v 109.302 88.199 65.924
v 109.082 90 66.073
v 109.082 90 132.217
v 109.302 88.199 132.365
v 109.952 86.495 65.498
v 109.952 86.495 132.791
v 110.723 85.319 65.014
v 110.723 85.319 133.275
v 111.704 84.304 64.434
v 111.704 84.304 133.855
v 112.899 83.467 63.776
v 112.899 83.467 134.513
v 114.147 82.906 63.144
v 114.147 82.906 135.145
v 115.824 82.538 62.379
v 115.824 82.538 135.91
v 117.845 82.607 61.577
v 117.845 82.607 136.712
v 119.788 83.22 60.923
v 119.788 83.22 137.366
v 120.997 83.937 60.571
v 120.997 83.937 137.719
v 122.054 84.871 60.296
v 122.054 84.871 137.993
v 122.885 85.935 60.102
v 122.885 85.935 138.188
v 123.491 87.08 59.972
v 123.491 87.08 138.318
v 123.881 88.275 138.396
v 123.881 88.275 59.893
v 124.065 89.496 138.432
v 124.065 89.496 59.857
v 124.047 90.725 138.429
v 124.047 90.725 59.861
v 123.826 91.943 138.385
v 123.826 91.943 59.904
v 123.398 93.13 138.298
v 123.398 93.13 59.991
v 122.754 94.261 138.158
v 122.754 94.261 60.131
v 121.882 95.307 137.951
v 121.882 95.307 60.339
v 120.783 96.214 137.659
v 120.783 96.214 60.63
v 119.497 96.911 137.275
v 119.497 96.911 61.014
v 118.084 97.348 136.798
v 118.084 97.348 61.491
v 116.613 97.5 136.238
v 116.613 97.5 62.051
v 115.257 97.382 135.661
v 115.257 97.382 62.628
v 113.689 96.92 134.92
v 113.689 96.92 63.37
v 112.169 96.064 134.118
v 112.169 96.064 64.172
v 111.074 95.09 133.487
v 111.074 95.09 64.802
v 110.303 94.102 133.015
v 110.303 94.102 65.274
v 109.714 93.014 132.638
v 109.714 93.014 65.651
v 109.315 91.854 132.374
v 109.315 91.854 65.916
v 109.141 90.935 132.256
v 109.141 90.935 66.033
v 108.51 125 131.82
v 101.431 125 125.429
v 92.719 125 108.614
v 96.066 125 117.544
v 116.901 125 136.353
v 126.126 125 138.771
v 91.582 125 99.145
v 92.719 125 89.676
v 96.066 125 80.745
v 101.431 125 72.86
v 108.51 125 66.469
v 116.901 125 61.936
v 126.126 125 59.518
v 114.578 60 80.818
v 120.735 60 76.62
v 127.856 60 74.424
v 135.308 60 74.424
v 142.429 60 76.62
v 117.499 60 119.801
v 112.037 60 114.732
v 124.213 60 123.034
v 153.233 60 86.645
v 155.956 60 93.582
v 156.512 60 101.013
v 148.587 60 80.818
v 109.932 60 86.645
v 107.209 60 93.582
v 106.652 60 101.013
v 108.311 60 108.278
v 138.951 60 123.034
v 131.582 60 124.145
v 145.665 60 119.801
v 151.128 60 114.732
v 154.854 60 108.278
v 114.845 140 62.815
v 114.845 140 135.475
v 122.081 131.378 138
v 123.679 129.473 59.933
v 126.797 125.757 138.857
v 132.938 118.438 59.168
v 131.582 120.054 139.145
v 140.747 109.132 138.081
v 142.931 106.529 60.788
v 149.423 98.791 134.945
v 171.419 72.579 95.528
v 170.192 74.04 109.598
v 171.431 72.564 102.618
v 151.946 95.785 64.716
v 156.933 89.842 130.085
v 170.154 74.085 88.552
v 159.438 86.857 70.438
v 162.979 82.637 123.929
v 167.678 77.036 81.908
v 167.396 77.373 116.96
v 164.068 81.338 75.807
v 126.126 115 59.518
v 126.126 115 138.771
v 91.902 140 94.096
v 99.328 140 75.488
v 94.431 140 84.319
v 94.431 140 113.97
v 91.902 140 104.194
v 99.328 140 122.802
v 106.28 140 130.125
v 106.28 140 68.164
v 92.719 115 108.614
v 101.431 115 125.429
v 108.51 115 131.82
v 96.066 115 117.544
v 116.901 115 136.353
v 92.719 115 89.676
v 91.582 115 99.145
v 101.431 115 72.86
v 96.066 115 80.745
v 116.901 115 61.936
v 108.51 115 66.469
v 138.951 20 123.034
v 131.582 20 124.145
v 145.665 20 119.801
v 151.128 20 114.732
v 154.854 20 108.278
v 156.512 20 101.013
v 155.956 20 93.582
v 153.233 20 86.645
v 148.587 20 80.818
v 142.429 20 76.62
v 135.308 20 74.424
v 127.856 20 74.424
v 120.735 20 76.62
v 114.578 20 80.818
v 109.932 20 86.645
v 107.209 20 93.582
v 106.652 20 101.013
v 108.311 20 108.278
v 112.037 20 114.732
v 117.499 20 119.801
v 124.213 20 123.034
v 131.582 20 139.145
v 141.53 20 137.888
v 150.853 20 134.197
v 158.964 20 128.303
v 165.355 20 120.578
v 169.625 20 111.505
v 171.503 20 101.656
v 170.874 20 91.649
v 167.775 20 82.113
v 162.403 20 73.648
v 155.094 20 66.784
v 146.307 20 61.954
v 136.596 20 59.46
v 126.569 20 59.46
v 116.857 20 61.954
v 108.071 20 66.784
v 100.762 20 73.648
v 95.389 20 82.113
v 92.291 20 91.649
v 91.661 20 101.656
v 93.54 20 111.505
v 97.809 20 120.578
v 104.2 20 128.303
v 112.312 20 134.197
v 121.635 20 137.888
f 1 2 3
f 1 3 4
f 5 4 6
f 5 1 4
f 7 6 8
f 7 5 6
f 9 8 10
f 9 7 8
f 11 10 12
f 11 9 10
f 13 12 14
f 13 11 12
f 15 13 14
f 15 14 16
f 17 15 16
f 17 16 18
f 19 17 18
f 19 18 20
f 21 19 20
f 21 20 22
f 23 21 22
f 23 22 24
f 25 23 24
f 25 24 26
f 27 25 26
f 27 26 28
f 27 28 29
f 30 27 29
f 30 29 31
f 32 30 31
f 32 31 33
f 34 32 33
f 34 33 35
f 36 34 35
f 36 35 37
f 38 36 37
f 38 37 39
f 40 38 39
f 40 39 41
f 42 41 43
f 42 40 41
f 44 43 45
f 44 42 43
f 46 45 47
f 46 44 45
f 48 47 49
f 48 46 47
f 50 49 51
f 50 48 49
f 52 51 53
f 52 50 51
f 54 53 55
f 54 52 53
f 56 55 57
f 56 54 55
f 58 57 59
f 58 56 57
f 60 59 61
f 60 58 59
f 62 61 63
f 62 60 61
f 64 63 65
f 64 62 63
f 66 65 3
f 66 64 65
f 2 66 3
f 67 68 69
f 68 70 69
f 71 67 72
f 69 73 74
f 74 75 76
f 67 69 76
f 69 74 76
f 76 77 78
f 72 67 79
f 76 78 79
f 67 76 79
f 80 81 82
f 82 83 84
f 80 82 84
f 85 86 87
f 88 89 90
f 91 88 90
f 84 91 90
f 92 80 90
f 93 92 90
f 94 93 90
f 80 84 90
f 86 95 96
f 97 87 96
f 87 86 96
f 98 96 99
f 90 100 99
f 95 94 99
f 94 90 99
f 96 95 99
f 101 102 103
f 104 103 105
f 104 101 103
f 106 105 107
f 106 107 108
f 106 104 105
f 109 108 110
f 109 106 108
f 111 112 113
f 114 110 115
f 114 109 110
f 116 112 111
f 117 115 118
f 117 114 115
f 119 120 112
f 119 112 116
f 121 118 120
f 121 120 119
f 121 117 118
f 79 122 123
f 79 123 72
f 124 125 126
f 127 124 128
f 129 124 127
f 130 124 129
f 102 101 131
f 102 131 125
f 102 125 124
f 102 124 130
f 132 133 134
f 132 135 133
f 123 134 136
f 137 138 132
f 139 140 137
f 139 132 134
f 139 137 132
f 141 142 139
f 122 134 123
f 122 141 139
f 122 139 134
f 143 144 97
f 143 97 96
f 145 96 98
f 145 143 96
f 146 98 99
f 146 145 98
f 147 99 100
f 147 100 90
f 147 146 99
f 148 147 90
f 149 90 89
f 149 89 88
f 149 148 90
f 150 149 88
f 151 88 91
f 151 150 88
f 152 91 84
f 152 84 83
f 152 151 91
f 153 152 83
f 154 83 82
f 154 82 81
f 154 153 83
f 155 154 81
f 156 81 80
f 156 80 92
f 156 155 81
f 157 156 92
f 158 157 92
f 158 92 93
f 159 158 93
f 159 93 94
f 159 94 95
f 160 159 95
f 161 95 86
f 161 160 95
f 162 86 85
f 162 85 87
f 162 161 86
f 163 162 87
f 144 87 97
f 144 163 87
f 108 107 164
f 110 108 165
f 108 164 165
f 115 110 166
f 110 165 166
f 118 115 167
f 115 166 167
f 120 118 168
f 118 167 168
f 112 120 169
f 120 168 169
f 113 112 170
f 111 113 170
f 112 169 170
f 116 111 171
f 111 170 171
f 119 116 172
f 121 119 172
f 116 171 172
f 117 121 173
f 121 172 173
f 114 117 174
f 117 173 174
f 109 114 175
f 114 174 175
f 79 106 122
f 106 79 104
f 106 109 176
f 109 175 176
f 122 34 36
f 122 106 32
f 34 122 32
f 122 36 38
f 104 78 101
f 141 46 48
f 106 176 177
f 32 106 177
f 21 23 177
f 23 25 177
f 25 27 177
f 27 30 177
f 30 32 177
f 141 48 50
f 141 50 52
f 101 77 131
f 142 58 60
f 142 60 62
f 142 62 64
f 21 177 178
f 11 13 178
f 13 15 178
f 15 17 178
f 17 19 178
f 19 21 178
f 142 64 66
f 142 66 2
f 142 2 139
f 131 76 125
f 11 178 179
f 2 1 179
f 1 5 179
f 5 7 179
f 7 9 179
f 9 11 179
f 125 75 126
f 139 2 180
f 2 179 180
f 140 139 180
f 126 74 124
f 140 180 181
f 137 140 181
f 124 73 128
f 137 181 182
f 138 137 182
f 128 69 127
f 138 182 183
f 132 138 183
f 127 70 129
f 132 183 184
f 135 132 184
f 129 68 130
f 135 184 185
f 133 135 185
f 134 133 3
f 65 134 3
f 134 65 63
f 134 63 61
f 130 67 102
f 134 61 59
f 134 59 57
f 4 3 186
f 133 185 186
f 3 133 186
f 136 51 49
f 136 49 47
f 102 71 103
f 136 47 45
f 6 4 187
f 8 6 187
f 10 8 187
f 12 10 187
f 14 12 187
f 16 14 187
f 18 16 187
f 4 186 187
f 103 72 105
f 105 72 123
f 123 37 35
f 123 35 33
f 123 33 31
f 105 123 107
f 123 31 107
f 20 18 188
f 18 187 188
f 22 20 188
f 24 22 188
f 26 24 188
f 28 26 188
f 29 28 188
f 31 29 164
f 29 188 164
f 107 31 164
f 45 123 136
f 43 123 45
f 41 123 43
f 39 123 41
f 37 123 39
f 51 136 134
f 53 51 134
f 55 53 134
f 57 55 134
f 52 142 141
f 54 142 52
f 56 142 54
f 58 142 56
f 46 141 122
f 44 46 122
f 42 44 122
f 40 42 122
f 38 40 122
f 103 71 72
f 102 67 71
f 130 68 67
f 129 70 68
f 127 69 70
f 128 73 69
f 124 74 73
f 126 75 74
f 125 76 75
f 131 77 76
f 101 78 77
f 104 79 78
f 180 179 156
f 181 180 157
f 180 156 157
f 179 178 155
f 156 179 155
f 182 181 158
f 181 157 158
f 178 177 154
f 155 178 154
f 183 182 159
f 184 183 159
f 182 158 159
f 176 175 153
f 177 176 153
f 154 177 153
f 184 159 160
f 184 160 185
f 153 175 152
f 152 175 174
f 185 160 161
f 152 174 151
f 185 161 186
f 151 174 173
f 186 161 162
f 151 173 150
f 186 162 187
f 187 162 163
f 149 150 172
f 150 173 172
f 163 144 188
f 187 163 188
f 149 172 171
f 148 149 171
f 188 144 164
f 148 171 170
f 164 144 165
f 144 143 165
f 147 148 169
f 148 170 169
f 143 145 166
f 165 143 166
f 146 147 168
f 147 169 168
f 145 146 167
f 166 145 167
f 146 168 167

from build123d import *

# Parameters (mm, degrees)
BOSS_EXTRUDE1_START = 20
SKETCH1_R           = 40
BOSS_EXTRUDE1_DEPTH = 120
CUT_EXTRUDE1_START  = 20
SKETCH1_4_R         = 25
CUT_EXTRUDE1_DEPTH  = 40
SKETCH2_R           = 7.5
SKETCH2_W           = 36.544112996
SKETCH2_H           = 10
CUT_EXTRUDE2_DEPTH  = 262.537261524


with BuildPart() as part:
    # Sketch1 → Boss-Extrude1 (new body)
    with BuildSketch(Plane(origin=(0, 0, 0), x_dir=(1, 0, 0), z_dir=(0, 1, 0)).offset(BOSS_EXTRUDE1_START)):
        with Locations(Location((131.582372263, -99.144632286, 0), (0, 0, 270))):
            Circle(SKETCH1_R)
    extrude(amount=BOSS_EXTRUDE1_DEPTH)

    # Sketch1<4> → Cut-Extrude1 (cut)
    with BuildSketch(Plane(origin=(0, 0, 0), x_dir=(1, 0, 0), z_dir=(0, 1, 0)).offset(CUT_EXTRUDE1_START)):
        with Locations(Location((131.582372263, -99.144632286, 0), (0, 0, 270))):
            Circle(SKETCH1_4_R)
    extrude(amount=CUT_EXTRUDE1_DEPTH, mode=Mode.SUBTRACT)

    # Sketch2 → Cut-Extrude2 (cut, through all)
    with BuildSketch(Plane.XY):
        with Locations(Location((116.582372263, 90, 0), (0, 0, 180))):
            Circle(SKETCH2_R)
        Polygon((113.167198818, 142), (173.582372263, 70), (173.582372263, 142), align=None)
        with Locations((107.854428761, 120)):
            Rectangle(SKETCH2_W, SKETCH2_H)
    extrude(amount=CUT_EXTRUDE2_DEPTH, mode=Mode.SUBTRACT)


solid = part.part
